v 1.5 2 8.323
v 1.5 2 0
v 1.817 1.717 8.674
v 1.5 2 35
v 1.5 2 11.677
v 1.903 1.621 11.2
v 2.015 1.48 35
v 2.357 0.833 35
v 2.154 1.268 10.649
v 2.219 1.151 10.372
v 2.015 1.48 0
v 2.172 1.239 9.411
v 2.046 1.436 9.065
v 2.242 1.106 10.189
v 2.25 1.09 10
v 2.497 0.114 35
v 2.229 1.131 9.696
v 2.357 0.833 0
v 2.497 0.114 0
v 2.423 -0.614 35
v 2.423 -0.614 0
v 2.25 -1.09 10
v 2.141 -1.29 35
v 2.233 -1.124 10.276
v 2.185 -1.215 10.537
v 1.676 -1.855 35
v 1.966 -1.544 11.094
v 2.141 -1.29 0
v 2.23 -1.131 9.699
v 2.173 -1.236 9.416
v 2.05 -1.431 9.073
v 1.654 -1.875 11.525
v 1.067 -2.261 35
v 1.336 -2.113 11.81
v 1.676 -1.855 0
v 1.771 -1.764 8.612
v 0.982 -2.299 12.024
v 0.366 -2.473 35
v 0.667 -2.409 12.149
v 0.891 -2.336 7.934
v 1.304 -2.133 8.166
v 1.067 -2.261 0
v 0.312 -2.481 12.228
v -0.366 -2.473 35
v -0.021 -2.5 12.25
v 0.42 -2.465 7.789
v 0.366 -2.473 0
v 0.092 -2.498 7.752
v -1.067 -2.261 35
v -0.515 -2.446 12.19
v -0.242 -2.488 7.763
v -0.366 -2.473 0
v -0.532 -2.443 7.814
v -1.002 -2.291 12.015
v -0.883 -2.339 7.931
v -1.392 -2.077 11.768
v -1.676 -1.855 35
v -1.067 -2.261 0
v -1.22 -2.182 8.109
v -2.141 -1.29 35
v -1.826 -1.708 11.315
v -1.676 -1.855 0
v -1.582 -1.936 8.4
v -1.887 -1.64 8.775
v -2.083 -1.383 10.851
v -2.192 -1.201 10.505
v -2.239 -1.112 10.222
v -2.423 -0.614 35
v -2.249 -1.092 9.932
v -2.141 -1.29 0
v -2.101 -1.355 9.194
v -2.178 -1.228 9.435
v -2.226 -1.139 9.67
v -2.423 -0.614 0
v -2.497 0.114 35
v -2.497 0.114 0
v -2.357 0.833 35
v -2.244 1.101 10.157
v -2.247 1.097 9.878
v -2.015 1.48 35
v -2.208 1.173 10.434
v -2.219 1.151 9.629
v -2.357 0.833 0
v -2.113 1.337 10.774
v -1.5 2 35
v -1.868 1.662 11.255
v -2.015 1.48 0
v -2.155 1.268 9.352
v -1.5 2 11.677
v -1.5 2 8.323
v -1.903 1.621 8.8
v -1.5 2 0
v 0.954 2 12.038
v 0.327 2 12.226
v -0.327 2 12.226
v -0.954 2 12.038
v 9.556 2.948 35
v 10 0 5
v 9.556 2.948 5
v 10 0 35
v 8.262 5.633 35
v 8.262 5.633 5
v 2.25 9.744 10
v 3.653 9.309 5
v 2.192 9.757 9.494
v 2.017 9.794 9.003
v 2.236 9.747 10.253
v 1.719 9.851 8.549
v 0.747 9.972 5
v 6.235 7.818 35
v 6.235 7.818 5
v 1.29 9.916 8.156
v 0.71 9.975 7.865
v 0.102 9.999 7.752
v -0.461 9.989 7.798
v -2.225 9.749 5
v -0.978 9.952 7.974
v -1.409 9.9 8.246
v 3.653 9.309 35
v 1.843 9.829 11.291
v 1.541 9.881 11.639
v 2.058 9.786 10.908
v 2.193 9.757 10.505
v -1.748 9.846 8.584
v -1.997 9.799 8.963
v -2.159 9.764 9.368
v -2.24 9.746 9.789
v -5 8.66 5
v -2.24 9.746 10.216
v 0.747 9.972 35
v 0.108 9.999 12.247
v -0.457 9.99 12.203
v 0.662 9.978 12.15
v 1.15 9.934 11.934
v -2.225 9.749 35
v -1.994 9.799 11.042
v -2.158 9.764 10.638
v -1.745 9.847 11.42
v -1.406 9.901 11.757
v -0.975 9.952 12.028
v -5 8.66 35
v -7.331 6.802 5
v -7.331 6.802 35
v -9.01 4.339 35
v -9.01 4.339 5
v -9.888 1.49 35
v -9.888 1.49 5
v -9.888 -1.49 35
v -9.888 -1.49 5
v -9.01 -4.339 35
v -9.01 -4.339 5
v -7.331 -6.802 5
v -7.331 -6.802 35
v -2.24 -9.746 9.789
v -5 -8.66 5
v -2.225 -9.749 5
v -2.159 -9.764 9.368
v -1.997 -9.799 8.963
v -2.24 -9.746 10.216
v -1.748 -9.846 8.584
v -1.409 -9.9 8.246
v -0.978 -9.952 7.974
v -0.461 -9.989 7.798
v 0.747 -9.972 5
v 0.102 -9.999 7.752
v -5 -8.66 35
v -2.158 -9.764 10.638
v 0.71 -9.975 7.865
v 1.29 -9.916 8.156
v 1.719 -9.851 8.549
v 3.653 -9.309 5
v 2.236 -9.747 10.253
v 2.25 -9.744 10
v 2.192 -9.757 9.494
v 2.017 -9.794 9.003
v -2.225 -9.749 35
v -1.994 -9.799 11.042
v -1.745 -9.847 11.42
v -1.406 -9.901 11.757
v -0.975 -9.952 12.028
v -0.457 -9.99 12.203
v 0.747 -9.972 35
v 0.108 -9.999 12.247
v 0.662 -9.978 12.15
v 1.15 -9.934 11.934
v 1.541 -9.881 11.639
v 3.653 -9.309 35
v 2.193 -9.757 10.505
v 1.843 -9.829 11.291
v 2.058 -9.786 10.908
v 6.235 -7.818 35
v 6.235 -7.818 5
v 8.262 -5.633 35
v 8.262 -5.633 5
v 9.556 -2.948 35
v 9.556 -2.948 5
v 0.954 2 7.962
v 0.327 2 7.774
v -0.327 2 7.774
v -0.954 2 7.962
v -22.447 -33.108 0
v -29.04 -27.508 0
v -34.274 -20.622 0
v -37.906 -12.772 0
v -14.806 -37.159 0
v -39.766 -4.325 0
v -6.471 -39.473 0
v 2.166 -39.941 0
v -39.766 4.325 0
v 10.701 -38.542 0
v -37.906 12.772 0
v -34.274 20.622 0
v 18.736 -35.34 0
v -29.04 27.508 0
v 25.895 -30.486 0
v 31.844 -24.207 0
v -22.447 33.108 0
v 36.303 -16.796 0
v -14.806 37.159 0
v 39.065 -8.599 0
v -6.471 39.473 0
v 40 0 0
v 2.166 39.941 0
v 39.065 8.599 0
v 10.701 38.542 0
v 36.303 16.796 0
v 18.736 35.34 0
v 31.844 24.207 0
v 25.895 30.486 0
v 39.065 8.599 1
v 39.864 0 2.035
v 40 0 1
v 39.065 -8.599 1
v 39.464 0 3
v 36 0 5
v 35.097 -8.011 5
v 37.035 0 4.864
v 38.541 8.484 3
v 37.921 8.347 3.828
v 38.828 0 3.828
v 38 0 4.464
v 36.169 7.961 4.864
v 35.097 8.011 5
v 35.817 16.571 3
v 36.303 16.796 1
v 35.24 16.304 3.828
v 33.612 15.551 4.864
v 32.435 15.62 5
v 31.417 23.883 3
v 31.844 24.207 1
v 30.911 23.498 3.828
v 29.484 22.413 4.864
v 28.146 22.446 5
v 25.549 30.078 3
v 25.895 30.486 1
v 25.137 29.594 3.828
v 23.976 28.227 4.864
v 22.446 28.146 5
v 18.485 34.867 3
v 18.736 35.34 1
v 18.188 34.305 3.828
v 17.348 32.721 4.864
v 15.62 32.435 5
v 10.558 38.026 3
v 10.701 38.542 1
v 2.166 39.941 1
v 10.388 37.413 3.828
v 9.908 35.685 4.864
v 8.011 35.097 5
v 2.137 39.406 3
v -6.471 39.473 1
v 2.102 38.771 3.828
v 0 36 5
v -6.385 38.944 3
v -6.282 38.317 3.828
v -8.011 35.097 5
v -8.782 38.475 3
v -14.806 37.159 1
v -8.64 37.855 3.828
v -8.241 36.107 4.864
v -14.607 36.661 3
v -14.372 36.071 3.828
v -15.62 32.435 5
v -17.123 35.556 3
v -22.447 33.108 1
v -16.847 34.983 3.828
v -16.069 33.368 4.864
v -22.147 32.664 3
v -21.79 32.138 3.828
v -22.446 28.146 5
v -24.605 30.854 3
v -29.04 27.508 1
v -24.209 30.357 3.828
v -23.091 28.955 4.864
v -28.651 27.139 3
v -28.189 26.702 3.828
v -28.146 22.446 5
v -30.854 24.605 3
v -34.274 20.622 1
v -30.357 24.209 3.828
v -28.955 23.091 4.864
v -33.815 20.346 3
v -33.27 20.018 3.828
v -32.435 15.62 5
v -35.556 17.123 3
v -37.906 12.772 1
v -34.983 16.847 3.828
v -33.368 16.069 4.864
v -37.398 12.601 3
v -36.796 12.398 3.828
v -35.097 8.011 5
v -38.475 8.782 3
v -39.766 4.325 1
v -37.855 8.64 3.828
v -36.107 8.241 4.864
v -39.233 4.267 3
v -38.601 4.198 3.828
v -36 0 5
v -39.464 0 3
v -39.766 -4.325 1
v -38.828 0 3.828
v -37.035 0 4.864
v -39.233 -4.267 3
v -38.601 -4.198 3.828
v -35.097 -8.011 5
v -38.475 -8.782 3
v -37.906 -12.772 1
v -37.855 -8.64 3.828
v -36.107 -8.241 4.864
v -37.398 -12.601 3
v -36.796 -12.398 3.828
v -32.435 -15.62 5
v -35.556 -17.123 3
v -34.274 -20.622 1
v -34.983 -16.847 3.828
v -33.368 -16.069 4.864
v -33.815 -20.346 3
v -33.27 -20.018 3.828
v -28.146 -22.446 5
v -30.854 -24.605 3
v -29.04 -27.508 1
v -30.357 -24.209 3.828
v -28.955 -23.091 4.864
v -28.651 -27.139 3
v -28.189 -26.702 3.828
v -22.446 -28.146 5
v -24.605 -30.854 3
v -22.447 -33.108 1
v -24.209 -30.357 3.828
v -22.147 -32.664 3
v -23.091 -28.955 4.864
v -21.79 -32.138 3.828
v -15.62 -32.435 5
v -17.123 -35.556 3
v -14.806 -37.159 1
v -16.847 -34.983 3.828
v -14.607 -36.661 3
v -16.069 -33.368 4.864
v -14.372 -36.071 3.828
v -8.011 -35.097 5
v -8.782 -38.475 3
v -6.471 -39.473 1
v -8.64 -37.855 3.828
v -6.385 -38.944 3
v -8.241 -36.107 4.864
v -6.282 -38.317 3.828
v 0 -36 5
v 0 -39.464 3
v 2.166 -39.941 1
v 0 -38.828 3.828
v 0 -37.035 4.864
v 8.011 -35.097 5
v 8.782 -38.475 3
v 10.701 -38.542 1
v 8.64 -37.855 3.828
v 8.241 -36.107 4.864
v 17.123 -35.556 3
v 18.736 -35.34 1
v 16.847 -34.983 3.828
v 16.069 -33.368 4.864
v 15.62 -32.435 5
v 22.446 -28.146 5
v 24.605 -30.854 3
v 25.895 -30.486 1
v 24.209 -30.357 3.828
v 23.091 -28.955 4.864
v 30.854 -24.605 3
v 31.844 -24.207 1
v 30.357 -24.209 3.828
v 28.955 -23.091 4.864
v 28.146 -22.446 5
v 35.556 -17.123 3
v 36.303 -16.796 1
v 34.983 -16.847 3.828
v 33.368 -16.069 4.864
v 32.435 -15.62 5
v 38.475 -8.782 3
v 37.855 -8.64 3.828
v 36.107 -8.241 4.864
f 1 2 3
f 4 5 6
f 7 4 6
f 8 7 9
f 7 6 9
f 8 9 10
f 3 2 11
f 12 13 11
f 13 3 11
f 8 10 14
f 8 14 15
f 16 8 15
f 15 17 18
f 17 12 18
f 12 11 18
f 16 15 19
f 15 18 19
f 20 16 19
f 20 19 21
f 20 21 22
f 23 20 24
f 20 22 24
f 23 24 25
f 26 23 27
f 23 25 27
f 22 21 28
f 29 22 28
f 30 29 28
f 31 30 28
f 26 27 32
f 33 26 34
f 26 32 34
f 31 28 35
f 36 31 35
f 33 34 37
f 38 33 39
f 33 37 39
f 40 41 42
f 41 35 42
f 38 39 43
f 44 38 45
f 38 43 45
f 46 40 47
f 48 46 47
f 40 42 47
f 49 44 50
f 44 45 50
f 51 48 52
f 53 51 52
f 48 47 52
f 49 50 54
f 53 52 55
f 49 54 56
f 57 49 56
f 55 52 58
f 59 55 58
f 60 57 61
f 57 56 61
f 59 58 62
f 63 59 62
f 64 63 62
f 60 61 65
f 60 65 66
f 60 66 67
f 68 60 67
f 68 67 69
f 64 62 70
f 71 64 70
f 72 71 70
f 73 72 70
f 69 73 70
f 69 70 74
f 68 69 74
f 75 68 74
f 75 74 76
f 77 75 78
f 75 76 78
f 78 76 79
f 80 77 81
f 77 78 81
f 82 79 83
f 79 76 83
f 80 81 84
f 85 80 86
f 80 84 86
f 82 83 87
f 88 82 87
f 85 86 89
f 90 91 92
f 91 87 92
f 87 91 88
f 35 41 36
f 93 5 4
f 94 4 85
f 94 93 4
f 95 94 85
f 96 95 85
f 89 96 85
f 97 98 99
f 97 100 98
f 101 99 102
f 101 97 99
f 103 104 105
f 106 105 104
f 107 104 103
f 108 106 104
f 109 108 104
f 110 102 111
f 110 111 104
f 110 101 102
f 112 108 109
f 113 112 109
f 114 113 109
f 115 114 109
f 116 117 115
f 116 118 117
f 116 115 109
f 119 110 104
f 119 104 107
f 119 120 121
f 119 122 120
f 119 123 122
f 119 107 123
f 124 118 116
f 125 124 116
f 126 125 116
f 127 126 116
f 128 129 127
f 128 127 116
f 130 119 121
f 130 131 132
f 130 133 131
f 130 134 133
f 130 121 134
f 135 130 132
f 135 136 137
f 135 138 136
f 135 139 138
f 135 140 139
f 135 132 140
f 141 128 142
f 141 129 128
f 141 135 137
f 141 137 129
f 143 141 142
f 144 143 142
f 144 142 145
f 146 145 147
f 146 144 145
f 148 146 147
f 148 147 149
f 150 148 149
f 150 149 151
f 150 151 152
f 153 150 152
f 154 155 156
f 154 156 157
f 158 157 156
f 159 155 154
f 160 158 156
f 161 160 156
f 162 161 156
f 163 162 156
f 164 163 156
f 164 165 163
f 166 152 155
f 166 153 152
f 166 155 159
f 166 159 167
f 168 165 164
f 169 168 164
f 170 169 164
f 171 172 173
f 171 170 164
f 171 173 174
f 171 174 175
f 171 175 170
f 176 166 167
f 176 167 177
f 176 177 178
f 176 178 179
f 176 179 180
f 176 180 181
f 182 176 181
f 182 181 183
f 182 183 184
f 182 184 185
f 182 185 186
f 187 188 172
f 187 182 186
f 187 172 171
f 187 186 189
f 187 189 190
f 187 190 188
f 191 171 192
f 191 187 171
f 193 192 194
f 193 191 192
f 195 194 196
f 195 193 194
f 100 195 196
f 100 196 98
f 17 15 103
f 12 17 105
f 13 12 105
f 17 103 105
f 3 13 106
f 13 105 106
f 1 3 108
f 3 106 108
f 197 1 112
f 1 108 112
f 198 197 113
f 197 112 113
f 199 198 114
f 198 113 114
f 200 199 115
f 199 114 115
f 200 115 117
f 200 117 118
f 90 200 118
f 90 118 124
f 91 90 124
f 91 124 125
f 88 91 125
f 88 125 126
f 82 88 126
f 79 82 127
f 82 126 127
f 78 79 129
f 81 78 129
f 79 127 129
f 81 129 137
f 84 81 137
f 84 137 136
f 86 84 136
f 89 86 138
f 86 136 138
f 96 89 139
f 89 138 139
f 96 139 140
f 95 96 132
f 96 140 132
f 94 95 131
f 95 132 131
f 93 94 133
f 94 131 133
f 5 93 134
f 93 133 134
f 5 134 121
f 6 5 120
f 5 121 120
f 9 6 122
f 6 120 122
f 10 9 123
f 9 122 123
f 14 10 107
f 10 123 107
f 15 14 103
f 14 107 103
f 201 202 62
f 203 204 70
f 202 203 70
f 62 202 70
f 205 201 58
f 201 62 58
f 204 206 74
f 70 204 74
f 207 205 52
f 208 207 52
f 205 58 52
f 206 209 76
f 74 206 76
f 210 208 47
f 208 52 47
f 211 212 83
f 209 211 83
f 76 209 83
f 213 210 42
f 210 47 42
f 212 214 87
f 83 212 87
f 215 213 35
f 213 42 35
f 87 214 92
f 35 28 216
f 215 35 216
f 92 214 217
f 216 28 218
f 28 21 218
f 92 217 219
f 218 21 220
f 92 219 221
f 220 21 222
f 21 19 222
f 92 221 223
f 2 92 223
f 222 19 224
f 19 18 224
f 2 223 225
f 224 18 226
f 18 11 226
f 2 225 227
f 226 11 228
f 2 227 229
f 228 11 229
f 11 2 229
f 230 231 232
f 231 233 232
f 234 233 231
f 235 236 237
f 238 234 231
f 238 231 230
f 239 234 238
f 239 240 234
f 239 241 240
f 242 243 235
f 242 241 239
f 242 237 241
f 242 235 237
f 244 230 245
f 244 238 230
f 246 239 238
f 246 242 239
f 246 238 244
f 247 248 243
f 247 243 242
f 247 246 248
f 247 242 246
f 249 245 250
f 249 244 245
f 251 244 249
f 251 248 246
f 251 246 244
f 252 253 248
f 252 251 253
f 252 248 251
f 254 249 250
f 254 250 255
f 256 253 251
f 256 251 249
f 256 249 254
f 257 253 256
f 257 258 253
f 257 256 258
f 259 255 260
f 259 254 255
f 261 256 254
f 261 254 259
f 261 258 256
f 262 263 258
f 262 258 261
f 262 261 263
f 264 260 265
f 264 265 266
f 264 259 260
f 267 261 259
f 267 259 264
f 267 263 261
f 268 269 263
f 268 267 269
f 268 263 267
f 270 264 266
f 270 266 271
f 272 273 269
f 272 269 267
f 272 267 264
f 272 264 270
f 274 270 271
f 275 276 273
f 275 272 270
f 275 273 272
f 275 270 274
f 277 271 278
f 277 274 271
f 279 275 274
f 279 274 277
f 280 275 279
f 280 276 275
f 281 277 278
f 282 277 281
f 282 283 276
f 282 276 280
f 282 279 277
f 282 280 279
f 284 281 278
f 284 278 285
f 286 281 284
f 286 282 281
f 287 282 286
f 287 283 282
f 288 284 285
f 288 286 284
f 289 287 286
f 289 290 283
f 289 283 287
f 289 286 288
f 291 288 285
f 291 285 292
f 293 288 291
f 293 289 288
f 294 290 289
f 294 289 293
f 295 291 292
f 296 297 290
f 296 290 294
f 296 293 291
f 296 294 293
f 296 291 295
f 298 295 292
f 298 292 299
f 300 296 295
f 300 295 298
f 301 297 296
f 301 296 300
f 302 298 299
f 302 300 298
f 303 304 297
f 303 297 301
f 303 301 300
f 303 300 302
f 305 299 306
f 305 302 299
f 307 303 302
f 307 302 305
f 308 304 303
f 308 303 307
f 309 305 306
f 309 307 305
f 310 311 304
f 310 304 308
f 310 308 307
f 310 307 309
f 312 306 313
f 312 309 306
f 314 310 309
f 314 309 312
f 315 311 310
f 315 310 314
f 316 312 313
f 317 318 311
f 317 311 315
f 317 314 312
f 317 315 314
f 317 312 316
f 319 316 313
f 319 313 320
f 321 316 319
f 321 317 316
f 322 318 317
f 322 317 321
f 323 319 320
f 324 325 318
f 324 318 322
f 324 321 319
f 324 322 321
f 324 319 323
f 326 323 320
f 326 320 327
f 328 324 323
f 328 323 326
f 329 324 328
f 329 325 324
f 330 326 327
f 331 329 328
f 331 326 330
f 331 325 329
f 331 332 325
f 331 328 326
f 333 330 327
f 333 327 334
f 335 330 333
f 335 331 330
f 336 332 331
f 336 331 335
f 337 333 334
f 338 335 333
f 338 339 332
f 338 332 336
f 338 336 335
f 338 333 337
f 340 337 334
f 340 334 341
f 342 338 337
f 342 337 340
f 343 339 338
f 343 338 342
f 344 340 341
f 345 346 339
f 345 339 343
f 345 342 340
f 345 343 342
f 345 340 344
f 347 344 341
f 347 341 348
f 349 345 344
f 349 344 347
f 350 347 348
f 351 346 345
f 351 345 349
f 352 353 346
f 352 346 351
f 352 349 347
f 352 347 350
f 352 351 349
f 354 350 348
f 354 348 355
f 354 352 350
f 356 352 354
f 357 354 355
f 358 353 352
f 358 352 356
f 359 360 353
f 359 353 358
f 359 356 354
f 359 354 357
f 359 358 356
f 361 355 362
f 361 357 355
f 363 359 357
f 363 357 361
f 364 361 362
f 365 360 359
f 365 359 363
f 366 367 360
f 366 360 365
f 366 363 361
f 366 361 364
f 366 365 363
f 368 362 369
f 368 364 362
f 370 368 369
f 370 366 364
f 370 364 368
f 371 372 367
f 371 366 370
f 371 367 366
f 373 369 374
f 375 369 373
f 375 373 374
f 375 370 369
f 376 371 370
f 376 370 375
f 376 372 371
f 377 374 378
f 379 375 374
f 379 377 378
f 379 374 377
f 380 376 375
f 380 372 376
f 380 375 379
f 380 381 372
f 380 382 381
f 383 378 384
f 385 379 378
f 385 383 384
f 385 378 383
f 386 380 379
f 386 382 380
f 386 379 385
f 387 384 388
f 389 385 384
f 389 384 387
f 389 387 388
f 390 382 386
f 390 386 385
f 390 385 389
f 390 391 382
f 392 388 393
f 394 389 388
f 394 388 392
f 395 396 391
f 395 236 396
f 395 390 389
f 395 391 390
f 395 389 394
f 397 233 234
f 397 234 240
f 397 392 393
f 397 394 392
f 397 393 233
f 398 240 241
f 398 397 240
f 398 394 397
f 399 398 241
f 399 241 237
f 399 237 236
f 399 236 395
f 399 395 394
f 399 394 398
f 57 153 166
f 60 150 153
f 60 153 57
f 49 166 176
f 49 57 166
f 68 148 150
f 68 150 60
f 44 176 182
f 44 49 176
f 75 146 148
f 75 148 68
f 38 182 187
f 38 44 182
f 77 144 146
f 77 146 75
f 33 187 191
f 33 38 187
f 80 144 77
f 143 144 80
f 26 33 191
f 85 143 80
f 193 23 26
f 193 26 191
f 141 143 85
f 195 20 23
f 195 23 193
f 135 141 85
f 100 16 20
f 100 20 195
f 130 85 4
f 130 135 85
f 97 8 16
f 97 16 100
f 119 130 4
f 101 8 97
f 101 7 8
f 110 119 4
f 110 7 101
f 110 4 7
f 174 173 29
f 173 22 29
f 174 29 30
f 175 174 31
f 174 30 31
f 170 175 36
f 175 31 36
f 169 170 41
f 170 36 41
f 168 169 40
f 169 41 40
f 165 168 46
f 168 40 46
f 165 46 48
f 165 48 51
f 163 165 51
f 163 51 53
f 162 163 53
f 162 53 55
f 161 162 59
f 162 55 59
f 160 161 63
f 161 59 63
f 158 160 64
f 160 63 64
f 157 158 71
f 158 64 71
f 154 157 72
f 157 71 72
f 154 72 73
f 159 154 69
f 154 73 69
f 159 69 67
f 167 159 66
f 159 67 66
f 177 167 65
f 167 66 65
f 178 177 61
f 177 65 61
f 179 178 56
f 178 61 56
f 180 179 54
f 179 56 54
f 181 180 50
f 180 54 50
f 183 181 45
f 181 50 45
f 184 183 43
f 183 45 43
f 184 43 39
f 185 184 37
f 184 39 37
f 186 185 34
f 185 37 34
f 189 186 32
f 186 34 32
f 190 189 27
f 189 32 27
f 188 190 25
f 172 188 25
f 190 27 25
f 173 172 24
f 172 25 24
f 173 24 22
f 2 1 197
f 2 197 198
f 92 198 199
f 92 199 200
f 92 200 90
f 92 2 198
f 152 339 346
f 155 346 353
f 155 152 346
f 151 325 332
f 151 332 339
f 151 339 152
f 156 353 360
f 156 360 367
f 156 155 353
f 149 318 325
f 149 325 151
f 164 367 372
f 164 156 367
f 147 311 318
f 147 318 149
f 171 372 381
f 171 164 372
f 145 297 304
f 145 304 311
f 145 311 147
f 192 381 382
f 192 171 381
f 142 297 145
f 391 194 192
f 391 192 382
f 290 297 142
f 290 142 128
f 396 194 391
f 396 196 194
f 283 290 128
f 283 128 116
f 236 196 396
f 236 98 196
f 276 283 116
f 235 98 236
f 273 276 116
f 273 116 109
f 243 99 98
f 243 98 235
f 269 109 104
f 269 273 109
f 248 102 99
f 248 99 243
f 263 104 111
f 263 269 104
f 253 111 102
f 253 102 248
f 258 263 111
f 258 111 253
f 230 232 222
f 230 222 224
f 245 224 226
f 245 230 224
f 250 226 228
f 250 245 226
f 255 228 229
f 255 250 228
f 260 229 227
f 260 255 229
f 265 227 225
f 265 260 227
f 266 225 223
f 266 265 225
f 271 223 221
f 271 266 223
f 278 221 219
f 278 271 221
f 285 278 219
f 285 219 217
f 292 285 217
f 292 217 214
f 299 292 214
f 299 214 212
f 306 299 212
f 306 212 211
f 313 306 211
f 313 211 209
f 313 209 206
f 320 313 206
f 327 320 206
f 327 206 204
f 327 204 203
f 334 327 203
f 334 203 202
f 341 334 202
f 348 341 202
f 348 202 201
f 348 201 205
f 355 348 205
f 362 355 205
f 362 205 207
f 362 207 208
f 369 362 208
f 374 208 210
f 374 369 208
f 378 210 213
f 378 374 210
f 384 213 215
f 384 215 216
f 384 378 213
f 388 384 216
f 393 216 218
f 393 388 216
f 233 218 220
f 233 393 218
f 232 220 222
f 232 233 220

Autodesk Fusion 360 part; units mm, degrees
sketch "Sketch1" plane through (0, 0, 0) normal (0, 0, 1) x (1, 0, 0)
  line L0 (1.5, 2) -> (-1.5, 2)
  arc A0 (-1.5, 2) -> (1.5, 2) centre (0, 0) ccw
cylinder "CylinderPrimitive1" add diameter 80 height 5 placed x (1, 0, 0) y (0, 1, 0) z (0, 0, 1) at (0, 0, 0) makes body 1
cylinder "CylinderPrimitive2" add diameter 20 height 30 placed x (1, 0, 0) y (0, 1, 0) z (0, 0, 1) at (0, 0, 5) bodies 1
extrude "Extrude1" cut sketch "Sketch1" along normal blind 44 bodies 1
fillet "Fillet1" radius 4 1 edges at (-37.2931, -14.4646, 5) on bodies 1
sketch "Sketch4" plane through (0, 0, 35) normal (0, 0, 1) x (-1, 0, 0)
  line L0 (1.5, -2) -> (-1.5, -2)
  arc A0 (1.5, -2) -> (-1.5, -2) centre (0, 0) ccw
  circle A1 centre (0, 0) radius 10
cylinder "CylinderPrimitive3" add diameter 4.5 height 31 placed x (1, 0, 0) y (0, 0, -1) z (0, 1, 0) at (0, 0, 10) separate body makes body 2
move_body "Move1" bodies 2 to x (1, 0, 0) y (0, 1, 0) z (0, 0, 1) at (0, -16, 0)
combine "Combine1" operation cut target body 1 tool bodies 2
